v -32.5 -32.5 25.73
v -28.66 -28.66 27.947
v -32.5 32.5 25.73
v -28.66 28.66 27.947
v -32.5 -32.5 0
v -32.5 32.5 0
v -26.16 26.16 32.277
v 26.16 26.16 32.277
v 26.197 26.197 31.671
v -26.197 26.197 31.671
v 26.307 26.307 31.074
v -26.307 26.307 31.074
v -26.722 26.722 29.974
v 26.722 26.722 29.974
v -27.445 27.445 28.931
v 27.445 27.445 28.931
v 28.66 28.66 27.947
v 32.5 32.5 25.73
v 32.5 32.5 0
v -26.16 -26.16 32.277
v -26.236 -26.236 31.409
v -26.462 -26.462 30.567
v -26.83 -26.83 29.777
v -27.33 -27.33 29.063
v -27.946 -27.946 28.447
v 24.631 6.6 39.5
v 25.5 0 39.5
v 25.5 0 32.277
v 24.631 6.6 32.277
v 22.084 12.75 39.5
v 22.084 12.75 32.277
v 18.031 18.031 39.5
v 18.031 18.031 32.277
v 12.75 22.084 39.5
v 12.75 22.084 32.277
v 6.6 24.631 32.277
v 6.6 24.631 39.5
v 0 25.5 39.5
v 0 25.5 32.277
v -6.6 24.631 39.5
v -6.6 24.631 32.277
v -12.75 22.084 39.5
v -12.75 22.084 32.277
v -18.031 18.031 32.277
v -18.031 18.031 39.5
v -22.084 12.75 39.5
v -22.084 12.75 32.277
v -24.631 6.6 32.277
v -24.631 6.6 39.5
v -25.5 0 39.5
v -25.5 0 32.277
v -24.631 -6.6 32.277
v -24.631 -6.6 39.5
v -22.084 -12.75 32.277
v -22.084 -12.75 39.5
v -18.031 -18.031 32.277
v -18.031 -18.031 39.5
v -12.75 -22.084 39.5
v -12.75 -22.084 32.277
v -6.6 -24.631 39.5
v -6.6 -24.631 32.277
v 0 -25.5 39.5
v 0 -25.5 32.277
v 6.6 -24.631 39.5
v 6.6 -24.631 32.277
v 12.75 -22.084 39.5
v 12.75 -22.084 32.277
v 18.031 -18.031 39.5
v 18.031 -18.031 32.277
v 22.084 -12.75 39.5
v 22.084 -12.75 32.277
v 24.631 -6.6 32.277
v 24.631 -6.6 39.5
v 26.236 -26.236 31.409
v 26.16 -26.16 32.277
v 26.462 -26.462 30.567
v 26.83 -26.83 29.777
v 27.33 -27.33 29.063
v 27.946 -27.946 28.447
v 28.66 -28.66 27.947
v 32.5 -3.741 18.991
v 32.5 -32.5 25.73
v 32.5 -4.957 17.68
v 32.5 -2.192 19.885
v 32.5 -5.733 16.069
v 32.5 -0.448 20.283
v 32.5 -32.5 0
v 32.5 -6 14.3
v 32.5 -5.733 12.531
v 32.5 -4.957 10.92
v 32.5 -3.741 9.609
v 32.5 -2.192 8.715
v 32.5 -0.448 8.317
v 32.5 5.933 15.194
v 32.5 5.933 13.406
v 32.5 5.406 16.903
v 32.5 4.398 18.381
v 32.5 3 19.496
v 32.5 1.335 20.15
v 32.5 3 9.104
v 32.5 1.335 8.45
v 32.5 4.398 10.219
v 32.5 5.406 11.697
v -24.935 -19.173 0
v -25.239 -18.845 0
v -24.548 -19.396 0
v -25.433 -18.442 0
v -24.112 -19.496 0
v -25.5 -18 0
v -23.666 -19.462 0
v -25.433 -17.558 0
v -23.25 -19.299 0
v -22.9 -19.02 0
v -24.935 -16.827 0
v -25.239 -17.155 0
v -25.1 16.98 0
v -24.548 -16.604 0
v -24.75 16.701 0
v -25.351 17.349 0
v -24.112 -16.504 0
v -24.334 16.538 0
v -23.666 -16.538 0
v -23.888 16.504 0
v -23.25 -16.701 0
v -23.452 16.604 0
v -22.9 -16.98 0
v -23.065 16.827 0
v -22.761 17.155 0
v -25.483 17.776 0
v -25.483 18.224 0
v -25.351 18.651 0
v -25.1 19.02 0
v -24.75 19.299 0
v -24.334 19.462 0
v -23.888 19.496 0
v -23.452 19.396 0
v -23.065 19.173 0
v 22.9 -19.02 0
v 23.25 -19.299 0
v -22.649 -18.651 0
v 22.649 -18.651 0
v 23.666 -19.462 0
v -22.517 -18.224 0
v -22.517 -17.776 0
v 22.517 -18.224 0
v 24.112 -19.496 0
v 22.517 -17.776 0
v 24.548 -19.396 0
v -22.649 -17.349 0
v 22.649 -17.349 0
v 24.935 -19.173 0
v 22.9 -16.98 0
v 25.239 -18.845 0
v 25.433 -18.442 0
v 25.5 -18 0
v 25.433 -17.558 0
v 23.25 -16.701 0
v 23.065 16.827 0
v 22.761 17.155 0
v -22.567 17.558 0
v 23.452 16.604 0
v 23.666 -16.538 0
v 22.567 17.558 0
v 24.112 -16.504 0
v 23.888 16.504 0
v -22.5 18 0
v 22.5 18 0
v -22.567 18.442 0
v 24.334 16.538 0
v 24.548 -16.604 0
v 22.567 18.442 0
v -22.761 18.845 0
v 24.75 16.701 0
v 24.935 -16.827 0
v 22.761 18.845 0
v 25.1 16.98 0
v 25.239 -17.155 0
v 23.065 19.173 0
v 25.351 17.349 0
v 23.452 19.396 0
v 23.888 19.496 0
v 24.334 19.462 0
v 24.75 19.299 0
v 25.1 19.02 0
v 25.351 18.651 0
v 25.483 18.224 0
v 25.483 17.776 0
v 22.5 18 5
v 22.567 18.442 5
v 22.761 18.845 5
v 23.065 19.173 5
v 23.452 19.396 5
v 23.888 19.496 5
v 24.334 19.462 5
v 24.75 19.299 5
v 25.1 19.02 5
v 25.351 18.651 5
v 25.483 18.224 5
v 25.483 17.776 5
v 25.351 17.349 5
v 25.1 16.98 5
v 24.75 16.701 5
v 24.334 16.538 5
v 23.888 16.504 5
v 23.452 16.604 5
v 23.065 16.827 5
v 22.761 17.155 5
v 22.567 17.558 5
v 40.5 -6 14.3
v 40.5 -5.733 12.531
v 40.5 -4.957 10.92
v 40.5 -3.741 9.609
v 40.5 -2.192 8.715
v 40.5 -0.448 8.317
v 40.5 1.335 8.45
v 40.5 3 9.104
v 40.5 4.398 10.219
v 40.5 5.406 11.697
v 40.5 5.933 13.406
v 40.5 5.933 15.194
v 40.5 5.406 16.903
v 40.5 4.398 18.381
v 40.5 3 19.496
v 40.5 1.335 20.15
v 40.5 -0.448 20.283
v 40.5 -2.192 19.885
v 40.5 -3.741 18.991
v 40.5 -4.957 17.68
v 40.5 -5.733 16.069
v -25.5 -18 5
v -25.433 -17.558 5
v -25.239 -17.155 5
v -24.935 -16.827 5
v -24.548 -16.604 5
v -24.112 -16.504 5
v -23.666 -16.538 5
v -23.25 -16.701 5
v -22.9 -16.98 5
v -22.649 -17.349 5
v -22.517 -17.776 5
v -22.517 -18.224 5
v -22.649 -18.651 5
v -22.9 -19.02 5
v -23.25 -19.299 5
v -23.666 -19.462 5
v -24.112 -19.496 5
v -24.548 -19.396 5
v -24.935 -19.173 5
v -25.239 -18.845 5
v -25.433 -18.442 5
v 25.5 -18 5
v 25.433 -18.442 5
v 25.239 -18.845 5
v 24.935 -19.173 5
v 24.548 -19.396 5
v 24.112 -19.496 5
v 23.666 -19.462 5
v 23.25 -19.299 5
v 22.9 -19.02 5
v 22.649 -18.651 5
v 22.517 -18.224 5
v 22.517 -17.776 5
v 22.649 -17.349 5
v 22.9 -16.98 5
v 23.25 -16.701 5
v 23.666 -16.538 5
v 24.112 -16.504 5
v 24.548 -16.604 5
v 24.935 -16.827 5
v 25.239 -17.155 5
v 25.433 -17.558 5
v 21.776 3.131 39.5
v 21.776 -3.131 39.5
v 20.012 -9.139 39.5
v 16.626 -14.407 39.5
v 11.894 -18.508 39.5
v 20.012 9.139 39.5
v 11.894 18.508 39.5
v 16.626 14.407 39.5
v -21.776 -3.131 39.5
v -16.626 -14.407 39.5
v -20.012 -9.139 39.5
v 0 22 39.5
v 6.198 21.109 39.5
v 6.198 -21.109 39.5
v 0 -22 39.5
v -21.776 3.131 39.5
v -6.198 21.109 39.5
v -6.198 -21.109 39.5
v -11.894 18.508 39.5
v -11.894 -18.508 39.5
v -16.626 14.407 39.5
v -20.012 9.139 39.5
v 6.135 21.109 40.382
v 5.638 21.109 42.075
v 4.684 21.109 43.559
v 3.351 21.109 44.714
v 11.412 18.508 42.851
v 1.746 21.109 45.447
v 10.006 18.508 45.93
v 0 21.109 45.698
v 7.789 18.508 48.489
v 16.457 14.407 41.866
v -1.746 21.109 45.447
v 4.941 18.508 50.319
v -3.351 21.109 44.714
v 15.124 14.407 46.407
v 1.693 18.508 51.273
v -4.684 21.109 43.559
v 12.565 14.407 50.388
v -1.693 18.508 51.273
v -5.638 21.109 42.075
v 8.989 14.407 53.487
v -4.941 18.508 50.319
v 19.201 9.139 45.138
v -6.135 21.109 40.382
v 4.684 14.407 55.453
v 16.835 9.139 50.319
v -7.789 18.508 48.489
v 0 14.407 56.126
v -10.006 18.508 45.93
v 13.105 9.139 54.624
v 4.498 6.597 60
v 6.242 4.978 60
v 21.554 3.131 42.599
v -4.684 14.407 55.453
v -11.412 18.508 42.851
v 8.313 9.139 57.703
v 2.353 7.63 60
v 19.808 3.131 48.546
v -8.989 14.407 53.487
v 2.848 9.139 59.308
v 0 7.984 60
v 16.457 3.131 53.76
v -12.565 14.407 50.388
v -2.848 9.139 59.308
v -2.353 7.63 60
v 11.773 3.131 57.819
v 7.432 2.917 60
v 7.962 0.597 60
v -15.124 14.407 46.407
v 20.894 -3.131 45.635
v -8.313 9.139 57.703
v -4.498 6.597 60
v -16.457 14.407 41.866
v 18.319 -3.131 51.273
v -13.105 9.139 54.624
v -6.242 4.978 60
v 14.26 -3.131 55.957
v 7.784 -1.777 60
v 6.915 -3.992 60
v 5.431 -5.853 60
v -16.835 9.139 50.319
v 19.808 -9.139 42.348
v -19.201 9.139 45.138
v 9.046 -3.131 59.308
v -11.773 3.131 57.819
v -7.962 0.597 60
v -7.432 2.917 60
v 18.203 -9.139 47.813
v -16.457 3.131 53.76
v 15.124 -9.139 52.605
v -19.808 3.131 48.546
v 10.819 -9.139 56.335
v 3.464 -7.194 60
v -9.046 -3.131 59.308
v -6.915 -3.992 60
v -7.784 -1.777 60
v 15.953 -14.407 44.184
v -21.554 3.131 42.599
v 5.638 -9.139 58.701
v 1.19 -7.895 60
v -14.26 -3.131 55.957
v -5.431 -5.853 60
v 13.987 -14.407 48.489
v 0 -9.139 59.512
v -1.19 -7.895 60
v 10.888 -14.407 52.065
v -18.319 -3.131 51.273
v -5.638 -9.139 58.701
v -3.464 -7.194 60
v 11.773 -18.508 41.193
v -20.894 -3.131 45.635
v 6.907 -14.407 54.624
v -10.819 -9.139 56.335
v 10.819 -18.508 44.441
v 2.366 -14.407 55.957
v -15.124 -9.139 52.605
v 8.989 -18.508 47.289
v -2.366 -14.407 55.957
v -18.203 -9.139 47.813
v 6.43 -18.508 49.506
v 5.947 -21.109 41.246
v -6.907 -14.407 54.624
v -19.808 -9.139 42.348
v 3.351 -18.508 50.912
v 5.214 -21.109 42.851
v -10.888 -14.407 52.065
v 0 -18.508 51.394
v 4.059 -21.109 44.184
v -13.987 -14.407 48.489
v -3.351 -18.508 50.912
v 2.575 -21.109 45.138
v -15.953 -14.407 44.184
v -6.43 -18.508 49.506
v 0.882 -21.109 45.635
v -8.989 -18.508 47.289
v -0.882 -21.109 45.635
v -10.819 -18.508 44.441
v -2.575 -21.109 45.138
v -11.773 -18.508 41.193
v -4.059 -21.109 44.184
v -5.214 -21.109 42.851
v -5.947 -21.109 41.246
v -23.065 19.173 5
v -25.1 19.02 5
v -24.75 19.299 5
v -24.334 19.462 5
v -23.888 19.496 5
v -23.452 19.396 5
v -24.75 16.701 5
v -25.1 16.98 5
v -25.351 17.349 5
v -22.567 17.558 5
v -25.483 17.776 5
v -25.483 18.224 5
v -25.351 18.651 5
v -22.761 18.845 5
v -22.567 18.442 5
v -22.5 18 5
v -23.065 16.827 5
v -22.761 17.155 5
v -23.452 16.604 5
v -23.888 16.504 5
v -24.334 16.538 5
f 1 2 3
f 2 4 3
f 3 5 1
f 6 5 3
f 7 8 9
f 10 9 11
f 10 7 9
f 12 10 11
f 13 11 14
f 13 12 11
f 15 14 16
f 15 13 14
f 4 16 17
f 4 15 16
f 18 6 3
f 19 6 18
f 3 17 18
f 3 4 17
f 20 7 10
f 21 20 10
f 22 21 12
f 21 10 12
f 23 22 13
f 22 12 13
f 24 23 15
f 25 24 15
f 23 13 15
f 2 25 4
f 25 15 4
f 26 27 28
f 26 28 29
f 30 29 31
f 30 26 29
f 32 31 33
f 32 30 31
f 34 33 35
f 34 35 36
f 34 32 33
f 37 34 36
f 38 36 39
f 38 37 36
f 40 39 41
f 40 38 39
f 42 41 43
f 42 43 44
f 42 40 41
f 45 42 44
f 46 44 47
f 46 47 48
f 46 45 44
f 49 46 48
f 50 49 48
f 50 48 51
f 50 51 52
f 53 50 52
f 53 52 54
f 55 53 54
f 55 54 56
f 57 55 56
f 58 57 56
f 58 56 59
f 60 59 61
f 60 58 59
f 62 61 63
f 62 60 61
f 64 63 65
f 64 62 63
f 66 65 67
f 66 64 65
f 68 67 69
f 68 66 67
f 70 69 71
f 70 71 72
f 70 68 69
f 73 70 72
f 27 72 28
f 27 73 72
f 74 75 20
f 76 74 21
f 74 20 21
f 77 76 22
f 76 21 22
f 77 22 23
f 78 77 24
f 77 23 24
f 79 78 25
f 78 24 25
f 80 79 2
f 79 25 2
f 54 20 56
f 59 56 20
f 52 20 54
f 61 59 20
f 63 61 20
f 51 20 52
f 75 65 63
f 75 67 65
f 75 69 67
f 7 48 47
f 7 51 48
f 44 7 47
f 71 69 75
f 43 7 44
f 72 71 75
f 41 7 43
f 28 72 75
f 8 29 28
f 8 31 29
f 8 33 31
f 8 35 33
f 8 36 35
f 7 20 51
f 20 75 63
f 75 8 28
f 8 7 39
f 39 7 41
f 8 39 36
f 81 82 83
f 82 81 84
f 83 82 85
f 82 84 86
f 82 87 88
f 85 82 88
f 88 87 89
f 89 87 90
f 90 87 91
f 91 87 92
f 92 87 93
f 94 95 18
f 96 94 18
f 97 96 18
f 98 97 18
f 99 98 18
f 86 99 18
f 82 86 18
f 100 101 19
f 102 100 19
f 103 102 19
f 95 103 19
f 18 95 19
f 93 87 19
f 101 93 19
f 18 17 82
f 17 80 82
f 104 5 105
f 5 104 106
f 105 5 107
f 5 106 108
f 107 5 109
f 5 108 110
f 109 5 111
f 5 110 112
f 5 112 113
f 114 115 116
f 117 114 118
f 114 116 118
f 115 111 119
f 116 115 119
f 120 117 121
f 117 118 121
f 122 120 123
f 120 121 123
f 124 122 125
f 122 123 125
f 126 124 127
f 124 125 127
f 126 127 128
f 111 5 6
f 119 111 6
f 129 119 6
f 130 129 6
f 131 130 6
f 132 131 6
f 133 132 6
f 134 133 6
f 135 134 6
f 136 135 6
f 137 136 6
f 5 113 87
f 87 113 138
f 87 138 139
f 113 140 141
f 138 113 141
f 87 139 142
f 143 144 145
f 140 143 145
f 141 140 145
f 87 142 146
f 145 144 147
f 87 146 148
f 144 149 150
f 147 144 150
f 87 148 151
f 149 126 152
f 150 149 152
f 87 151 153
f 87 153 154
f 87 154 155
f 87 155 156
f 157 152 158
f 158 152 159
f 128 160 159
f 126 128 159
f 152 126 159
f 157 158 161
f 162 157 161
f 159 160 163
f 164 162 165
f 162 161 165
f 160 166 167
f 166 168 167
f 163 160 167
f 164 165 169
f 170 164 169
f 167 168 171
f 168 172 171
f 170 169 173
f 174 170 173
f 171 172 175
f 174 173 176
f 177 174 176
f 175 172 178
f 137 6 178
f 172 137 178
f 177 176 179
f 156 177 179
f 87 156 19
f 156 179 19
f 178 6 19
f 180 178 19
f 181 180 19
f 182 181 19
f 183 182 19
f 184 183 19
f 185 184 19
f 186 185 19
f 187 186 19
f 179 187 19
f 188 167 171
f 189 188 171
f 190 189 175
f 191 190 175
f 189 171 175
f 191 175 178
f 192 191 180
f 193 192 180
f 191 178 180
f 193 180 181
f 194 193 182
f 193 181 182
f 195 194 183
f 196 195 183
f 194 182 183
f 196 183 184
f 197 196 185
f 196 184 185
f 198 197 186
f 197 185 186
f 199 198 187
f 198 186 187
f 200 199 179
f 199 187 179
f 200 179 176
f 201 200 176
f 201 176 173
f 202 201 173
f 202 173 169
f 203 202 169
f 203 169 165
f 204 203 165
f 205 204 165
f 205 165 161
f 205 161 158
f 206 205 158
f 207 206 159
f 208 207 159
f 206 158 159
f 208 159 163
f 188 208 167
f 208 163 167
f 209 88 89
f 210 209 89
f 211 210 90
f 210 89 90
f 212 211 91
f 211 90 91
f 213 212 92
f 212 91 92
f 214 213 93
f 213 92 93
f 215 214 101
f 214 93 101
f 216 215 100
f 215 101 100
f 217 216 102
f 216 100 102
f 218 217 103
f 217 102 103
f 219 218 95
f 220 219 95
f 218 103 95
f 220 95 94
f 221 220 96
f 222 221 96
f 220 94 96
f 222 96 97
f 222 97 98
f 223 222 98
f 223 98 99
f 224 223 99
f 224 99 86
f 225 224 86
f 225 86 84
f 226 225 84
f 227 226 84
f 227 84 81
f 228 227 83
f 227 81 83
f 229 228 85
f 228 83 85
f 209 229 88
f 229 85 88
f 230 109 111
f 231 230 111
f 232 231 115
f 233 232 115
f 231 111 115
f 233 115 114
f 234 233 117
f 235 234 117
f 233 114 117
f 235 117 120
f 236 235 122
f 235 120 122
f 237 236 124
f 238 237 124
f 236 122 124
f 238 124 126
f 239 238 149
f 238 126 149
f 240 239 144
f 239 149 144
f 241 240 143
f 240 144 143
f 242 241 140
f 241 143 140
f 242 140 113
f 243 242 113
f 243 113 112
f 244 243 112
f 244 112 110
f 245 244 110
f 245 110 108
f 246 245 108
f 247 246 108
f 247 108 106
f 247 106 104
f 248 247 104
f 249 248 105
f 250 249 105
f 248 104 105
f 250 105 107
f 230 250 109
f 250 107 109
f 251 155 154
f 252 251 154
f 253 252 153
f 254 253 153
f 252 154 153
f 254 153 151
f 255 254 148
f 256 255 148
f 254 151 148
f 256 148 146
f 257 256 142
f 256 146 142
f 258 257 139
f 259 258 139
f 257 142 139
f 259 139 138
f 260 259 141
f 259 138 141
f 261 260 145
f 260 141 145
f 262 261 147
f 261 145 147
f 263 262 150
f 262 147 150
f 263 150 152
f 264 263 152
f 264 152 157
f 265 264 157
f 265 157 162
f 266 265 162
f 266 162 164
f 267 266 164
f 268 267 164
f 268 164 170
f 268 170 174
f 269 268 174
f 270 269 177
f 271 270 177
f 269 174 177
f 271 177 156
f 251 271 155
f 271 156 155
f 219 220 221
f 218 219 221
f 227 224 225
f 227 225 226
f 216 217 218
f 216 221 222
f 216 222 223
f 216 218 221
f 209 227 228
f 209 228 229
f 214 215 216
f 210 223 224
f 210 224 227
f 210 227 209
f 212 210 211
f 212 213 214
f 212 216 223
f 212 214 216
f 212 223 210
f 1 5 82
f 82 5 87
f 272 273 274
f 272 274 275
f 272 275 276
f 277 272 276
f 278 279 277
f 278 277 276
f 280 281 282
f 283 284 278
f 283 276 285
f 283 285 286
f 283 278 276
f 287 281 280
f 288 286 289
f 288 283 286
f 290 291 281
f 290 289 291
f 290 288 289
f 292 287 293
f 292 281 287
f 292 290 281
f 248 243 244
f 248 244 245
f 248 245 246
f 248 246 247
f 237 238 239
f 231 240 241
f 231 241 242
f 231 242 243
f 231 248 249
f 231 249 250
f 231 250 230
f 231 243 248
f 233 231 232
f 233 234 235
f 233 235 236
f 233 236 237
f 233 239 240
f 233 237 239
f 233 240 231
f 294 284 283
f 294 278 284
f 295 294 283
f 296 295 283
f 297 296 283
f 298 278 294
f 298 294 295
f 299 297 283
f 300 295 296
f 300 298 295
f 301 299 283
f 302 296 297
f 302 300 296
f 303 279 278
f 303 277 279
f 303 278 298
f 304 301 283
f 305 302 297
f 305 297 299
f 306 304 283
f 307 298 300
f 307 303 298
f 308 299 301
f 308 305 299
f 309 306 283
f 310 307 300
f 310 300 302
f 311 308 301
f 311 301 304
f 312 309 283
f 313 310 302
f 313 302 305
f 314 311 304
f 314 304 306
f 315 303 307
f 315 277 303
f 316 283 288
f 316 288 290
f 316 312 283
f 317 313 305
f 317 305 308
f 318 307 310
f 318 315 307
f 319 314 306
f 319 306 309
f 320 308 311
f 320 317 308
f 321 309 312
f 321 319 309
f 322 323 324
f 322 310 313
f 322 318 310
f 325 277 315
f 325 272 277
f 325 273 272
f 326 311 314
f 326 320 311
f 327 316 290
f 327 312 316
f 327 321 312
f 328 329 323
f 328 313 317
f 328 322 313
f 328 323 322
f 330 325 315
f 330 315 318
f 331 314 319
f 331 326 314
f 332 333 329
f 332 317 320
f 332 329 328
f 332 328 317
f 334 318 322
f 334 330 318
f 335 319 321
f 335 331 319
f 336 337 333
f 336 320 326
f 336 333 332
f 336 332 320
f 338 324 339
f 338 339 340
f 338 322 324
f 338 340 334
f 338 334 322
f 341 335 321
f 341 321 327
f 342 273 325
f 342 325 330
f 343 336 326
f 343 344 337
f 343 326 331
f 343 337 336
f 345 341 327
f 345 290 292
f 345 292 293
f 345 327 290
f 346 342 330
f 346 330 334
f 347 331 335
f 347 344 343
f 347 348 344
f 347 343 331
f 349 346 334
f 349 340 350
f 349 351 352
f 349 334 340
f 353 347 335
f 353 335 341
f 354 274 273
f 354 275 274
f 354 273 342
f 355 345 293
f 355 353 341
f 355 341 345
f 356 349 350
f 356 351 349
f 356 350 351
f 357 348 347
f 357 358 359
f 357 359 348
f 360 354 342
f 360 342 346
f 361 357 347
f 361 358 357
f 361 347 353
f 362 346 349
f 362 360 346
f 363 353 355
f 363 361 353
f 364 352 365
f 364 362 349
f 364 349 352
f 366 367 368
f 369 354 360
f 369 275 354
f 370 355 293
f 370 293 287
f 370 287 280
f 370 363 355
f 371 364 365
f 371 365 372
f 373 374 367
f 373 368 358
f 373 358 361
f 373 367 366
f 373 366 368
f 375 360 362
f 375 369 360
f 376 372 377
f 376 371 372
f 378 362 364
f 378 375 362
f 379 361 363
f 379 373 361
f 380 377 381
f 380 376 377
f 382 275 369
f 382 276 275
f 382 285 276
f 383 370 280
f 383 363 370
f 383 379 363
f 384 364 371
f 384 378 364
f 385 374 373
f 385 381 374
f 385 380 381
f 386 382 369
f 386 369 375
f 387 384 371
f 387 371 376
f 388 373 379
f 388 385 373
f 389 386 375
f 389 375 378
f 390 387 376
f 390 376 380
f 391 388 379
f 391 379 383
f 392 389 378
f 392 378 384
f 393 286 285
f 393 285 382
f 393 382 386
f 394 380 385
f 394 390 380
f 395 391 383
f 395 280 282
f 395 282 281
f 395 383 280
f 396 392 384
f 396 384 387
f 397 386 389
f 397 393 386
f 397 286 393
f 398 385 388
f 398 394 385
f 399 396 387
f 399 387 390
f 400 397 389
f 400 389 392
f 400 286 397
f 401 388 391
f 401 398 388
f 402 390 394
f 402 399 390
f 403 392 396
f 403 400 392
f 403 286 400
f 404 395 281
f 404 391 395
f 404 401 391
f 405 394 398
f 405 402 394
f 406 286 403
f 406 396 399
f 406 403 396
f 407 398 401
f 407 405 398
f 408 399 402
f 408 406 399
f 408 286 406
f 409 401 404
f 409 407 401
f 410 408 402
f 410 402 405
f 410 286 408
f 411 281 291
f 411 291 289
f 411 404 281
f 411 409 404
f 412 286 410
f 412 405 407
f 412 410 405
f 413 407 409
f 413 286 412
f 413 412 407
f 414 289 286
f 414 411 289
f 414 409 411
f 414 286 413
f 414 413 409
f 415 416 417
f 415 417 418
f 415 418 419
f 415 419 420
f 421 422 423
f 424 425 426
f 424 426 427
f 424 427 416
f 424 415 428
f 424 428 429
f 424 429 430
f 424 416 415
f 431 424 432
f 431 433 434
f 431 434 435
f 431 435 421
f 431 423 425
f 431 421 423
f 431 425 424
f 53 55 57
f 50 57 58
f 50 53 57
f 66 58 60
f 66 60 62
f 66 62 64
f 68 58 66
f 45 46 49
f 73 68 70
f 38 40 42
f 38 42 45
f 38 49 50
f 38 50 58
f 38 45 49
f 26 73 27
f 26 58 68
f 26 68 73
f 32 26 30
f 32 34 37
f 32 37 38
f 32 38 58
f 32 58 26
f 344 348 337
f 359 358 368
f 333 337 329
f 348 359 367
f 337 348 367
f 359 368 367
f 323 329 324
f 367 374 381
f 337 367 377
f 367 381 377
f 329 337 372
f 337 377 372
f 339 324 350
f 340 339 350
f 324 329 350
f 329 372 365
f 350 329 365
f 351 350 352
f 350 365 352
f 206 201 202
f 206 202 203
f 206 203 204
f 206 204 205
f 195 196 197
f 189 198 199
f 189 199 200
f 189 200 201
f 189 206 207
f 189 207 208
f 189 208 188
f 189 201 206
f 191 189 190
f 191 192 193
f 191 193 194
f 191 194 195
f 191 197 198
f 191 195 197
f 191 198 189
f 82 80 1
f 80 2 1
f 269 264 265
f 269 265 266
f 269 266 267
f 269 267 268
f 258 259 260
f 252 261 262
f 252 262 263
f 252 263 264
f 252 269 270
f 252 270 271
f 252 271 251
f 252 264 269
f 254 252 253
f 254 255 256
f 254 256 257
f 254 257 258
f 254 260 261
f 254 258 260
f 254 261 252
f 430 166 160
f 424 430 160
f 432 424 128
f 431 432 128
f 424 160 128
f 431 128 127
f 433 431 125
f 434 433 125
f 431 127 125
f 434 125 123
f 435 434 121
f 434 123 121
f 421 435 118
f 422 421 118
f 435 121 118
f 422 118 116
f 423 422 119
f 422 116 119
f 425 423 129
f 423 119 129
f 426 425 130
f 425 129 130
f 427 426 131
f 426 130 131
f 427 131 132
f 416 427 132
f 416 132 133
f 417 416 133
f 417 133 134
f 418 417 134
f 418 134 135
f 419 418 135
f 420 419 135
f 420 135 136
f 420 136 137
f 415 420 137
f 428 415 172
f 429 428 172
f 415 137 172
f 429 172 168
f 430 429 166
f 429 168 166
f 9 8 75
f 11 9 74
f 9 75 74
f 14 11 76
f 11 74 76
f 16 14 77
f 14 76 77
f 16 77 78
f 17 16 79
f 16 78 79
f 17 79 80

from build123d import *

# Parameters (mm, degrees)
SCHIZZO1_W                                = 65
SCHIZZO1_H                                = 65
ESTRUSIONE_ESTRUSIONE1_DEPTH              = 39.5
SCHIZZO2_R                                = 1.5
TAGLIO_ESTRUSIONE1_DEPTH                  = 5
SCHIZZO3_R                                = 6
ESTRUSIONE_ESTRUSIONE2_DEPTH              = 8
TAGLIO_ESTRUSIONE2_DEPTH                  = 32.5
RIPETIZIONECIRCOLARE1_COUNT               = 2
RIPETIZIONECIRCOLARE1_ANGLE               = 90
RIPETIZIONECIRCOLARE1_THE_OTHER_WAY_COUNT = 2
RIPETIZIONECIRCOLARE1_THE_OTHER_WAY_ANGLE = 90
SCHIZZO4_W                                = 52.3204051
SCHIZZO4_H                                = 52.3204051
SCHIZZO4_R                                = 25.5
TAGLIO_ESTRUSIONE3_DEPTH                  = 7.223249
RIVOLUZIONE2_ANGLE                        = 180
TAGLIO_ESTRUSIONE4_DEPTH                  = 81.490682691
TAGLIO_ESTRUSIONE4_DEPTH_BACK             = 81.490682691
SCHIZZO8_W                                = 20
SCHIZZO8_H                                = 2


with BuildPart() as part:
    # Schizzo1 → Estrusione-Estrusione1 (new body)
    with BuildSketch(Plane.XY):
        Rectangle(SCHIZZO1_W, SCHIZZO1_H)
    extrude(amount=ESTRUSIONE_ESTRUSIONE1_DEPTH)

    # Schizzo2 → Taglio-Estrusione1 (cut)
    with BuildSketch(Plane(origin=(0, 0, 0), x_dir=(-1, 0, 0), z_dir=(0, 0, -1))):
        with Locations((24, -18)):
            Circle(SCHIZZO2_R)
        with Locations(Location((-24, -18, 0), (0, 0, 180))):
            Circle(SCHIZZO2_R)
        with Locations((-24, 18)):
            Circle(SCHIZZO2_R)
        with Locations(Location((24, 18, 0), (0, 0, 180))):
            Circle(SCHIZZO2_R)
    extrude(amount=-TAGLIO_ESTRUSIONE1_DEPTH, mode=Mode.SUBTRACT)

    # Schizzo3 → Estrusione-Estrusione2 (add)
    with BuildSketch(Plane(origin=(32.5, 0, 0), x_dir=(0, 0, -1), z_dir=(1, 0, 0))):
        with Locations(Location((-14.3, 0, 0), (0, 0, 270))):
            Circle(SCHIZZO3_R)
    extrude(amount=ESTRUSIONE_ESTRUSIONE2_DEPTH)

    # Schizzo5 → Taglio-Estrusione2 (cut, symmetric)
    with BuildSketch(Plane.ZY):
        with BuildLine():
            Line((39.5, -32.5), (39.5, -26.16))
            Line((39.5, -26.16), (32.276751345, -26.16020255))
            ThreePointArc((32.276751345, -26.16020255), (29.77677013, -26.830145634), (27.946694431, -28.660323972))
            Line((27.946694431, -28.660323972), (25.73, -32.5))
            Line((25.73, -32.5), (39.5, -32.5))
        make_face()
    taglio_estrusione2 = extrude(amount=TAGLIO_ESTRUSIONE2_DEPTH, both=True, mode=Mode.SUBTRACT)

    # Specchia1: Taglio-Estrusione2 across plane
    add(taglio_estrusione2.mirror(Plane.ZX), mode=Mode.SUBTRACT)

    # RipetizioneCircolare1: Taglio-Estrusione2 ×2 about axis
    ripetizionecircolare1_axis = Axis((0, 0, -3), (0, 0, 1))
    for i in range(1, RIPETIZIONECIRCOLARE1_COUNT):
        add(taglio_estrusione2.rotate(ripetizionecircolare1_axis, i * RIPETIZIONECIRCOLARE1_ANGLE / (RIPETIZIONECIRCOLARE1_COUNT - 1)), mode=Mode.SUBTRACT)

    # RipetizioneCircolare1 the other way: Taglio-Estrusione2 ×2 about axis
    ripetizionecircolare1_the_other_way_axis = Axis((0, 0, -3), (0, 0, -1))
    for i in range(1, RIPETIZIONECIRCOLARE1_THE_OTHER_WAY_COUNT):
        add(taglio_estrusione2.rotate(ripetizionecircolare1_the_other_way_axis, i * RIPETIZIONECIRCOLARE1_THE_OTHER_WAY_ANGLE / (RIPETIZIONECIRCOLARE1_THE_OTHER_WAY_COUNT - 1)), mode=Mode.SUBTRACT)

    # Schizzo4 → Taglio-Estrusione3 (cut)
    with BuildSketch(Plane.XY.offset(39.5)):
        Rectangle(SCHIZZO4_W, SCHIZZO4_H)
        Circle(SCHIZZO4_R, mode=Mode.SUBTRACT)
    extrude(amount=-TAGLIO_ESTRUSIONE3_DEPTH, mode=Mode.SUBTRACT)


with BuildPart() as body_2:
    # Schizzo7 → Rivoluzione2 (revolve)
    with BuildSketch(Plane.XY.offset(39.5)):
        with BuildLine():
            ThreePointArc((0, 22), (22, 0), (0, -22))
            Line((0, -22), (0, 22))
        make_face()
    revolve(axis=Axis((0, 0, 39.5), (0, -1, 0)), revolution_arc=RIVOLUZIONE2_ANGLE)

    # Schizzo8 → Taglio-Estrusione4 (cut, two sides: drawn at the far end of the back side and taken through both)
    with BuildSketch(Plane(origin=(0, 0, 0), x_dir=(1, 0, 0), z_dir=(0, 1, 0)).offset(-TAGLIO_ESTRUSIONE4_DEPTH_BACK)):
        with Locations((0, -61)):
            Rectangle(SCHIZZO8_W, SCHIZZO8_H)
    extrude(amount=TAGLIO_ESTRUSIONE4_DEPTH + TAGLIO_ESTRUSIONE4_DEPTH_BACK, mode=Mode.SUBTRACT)


solid = Compound([part.part, body_2.part])
